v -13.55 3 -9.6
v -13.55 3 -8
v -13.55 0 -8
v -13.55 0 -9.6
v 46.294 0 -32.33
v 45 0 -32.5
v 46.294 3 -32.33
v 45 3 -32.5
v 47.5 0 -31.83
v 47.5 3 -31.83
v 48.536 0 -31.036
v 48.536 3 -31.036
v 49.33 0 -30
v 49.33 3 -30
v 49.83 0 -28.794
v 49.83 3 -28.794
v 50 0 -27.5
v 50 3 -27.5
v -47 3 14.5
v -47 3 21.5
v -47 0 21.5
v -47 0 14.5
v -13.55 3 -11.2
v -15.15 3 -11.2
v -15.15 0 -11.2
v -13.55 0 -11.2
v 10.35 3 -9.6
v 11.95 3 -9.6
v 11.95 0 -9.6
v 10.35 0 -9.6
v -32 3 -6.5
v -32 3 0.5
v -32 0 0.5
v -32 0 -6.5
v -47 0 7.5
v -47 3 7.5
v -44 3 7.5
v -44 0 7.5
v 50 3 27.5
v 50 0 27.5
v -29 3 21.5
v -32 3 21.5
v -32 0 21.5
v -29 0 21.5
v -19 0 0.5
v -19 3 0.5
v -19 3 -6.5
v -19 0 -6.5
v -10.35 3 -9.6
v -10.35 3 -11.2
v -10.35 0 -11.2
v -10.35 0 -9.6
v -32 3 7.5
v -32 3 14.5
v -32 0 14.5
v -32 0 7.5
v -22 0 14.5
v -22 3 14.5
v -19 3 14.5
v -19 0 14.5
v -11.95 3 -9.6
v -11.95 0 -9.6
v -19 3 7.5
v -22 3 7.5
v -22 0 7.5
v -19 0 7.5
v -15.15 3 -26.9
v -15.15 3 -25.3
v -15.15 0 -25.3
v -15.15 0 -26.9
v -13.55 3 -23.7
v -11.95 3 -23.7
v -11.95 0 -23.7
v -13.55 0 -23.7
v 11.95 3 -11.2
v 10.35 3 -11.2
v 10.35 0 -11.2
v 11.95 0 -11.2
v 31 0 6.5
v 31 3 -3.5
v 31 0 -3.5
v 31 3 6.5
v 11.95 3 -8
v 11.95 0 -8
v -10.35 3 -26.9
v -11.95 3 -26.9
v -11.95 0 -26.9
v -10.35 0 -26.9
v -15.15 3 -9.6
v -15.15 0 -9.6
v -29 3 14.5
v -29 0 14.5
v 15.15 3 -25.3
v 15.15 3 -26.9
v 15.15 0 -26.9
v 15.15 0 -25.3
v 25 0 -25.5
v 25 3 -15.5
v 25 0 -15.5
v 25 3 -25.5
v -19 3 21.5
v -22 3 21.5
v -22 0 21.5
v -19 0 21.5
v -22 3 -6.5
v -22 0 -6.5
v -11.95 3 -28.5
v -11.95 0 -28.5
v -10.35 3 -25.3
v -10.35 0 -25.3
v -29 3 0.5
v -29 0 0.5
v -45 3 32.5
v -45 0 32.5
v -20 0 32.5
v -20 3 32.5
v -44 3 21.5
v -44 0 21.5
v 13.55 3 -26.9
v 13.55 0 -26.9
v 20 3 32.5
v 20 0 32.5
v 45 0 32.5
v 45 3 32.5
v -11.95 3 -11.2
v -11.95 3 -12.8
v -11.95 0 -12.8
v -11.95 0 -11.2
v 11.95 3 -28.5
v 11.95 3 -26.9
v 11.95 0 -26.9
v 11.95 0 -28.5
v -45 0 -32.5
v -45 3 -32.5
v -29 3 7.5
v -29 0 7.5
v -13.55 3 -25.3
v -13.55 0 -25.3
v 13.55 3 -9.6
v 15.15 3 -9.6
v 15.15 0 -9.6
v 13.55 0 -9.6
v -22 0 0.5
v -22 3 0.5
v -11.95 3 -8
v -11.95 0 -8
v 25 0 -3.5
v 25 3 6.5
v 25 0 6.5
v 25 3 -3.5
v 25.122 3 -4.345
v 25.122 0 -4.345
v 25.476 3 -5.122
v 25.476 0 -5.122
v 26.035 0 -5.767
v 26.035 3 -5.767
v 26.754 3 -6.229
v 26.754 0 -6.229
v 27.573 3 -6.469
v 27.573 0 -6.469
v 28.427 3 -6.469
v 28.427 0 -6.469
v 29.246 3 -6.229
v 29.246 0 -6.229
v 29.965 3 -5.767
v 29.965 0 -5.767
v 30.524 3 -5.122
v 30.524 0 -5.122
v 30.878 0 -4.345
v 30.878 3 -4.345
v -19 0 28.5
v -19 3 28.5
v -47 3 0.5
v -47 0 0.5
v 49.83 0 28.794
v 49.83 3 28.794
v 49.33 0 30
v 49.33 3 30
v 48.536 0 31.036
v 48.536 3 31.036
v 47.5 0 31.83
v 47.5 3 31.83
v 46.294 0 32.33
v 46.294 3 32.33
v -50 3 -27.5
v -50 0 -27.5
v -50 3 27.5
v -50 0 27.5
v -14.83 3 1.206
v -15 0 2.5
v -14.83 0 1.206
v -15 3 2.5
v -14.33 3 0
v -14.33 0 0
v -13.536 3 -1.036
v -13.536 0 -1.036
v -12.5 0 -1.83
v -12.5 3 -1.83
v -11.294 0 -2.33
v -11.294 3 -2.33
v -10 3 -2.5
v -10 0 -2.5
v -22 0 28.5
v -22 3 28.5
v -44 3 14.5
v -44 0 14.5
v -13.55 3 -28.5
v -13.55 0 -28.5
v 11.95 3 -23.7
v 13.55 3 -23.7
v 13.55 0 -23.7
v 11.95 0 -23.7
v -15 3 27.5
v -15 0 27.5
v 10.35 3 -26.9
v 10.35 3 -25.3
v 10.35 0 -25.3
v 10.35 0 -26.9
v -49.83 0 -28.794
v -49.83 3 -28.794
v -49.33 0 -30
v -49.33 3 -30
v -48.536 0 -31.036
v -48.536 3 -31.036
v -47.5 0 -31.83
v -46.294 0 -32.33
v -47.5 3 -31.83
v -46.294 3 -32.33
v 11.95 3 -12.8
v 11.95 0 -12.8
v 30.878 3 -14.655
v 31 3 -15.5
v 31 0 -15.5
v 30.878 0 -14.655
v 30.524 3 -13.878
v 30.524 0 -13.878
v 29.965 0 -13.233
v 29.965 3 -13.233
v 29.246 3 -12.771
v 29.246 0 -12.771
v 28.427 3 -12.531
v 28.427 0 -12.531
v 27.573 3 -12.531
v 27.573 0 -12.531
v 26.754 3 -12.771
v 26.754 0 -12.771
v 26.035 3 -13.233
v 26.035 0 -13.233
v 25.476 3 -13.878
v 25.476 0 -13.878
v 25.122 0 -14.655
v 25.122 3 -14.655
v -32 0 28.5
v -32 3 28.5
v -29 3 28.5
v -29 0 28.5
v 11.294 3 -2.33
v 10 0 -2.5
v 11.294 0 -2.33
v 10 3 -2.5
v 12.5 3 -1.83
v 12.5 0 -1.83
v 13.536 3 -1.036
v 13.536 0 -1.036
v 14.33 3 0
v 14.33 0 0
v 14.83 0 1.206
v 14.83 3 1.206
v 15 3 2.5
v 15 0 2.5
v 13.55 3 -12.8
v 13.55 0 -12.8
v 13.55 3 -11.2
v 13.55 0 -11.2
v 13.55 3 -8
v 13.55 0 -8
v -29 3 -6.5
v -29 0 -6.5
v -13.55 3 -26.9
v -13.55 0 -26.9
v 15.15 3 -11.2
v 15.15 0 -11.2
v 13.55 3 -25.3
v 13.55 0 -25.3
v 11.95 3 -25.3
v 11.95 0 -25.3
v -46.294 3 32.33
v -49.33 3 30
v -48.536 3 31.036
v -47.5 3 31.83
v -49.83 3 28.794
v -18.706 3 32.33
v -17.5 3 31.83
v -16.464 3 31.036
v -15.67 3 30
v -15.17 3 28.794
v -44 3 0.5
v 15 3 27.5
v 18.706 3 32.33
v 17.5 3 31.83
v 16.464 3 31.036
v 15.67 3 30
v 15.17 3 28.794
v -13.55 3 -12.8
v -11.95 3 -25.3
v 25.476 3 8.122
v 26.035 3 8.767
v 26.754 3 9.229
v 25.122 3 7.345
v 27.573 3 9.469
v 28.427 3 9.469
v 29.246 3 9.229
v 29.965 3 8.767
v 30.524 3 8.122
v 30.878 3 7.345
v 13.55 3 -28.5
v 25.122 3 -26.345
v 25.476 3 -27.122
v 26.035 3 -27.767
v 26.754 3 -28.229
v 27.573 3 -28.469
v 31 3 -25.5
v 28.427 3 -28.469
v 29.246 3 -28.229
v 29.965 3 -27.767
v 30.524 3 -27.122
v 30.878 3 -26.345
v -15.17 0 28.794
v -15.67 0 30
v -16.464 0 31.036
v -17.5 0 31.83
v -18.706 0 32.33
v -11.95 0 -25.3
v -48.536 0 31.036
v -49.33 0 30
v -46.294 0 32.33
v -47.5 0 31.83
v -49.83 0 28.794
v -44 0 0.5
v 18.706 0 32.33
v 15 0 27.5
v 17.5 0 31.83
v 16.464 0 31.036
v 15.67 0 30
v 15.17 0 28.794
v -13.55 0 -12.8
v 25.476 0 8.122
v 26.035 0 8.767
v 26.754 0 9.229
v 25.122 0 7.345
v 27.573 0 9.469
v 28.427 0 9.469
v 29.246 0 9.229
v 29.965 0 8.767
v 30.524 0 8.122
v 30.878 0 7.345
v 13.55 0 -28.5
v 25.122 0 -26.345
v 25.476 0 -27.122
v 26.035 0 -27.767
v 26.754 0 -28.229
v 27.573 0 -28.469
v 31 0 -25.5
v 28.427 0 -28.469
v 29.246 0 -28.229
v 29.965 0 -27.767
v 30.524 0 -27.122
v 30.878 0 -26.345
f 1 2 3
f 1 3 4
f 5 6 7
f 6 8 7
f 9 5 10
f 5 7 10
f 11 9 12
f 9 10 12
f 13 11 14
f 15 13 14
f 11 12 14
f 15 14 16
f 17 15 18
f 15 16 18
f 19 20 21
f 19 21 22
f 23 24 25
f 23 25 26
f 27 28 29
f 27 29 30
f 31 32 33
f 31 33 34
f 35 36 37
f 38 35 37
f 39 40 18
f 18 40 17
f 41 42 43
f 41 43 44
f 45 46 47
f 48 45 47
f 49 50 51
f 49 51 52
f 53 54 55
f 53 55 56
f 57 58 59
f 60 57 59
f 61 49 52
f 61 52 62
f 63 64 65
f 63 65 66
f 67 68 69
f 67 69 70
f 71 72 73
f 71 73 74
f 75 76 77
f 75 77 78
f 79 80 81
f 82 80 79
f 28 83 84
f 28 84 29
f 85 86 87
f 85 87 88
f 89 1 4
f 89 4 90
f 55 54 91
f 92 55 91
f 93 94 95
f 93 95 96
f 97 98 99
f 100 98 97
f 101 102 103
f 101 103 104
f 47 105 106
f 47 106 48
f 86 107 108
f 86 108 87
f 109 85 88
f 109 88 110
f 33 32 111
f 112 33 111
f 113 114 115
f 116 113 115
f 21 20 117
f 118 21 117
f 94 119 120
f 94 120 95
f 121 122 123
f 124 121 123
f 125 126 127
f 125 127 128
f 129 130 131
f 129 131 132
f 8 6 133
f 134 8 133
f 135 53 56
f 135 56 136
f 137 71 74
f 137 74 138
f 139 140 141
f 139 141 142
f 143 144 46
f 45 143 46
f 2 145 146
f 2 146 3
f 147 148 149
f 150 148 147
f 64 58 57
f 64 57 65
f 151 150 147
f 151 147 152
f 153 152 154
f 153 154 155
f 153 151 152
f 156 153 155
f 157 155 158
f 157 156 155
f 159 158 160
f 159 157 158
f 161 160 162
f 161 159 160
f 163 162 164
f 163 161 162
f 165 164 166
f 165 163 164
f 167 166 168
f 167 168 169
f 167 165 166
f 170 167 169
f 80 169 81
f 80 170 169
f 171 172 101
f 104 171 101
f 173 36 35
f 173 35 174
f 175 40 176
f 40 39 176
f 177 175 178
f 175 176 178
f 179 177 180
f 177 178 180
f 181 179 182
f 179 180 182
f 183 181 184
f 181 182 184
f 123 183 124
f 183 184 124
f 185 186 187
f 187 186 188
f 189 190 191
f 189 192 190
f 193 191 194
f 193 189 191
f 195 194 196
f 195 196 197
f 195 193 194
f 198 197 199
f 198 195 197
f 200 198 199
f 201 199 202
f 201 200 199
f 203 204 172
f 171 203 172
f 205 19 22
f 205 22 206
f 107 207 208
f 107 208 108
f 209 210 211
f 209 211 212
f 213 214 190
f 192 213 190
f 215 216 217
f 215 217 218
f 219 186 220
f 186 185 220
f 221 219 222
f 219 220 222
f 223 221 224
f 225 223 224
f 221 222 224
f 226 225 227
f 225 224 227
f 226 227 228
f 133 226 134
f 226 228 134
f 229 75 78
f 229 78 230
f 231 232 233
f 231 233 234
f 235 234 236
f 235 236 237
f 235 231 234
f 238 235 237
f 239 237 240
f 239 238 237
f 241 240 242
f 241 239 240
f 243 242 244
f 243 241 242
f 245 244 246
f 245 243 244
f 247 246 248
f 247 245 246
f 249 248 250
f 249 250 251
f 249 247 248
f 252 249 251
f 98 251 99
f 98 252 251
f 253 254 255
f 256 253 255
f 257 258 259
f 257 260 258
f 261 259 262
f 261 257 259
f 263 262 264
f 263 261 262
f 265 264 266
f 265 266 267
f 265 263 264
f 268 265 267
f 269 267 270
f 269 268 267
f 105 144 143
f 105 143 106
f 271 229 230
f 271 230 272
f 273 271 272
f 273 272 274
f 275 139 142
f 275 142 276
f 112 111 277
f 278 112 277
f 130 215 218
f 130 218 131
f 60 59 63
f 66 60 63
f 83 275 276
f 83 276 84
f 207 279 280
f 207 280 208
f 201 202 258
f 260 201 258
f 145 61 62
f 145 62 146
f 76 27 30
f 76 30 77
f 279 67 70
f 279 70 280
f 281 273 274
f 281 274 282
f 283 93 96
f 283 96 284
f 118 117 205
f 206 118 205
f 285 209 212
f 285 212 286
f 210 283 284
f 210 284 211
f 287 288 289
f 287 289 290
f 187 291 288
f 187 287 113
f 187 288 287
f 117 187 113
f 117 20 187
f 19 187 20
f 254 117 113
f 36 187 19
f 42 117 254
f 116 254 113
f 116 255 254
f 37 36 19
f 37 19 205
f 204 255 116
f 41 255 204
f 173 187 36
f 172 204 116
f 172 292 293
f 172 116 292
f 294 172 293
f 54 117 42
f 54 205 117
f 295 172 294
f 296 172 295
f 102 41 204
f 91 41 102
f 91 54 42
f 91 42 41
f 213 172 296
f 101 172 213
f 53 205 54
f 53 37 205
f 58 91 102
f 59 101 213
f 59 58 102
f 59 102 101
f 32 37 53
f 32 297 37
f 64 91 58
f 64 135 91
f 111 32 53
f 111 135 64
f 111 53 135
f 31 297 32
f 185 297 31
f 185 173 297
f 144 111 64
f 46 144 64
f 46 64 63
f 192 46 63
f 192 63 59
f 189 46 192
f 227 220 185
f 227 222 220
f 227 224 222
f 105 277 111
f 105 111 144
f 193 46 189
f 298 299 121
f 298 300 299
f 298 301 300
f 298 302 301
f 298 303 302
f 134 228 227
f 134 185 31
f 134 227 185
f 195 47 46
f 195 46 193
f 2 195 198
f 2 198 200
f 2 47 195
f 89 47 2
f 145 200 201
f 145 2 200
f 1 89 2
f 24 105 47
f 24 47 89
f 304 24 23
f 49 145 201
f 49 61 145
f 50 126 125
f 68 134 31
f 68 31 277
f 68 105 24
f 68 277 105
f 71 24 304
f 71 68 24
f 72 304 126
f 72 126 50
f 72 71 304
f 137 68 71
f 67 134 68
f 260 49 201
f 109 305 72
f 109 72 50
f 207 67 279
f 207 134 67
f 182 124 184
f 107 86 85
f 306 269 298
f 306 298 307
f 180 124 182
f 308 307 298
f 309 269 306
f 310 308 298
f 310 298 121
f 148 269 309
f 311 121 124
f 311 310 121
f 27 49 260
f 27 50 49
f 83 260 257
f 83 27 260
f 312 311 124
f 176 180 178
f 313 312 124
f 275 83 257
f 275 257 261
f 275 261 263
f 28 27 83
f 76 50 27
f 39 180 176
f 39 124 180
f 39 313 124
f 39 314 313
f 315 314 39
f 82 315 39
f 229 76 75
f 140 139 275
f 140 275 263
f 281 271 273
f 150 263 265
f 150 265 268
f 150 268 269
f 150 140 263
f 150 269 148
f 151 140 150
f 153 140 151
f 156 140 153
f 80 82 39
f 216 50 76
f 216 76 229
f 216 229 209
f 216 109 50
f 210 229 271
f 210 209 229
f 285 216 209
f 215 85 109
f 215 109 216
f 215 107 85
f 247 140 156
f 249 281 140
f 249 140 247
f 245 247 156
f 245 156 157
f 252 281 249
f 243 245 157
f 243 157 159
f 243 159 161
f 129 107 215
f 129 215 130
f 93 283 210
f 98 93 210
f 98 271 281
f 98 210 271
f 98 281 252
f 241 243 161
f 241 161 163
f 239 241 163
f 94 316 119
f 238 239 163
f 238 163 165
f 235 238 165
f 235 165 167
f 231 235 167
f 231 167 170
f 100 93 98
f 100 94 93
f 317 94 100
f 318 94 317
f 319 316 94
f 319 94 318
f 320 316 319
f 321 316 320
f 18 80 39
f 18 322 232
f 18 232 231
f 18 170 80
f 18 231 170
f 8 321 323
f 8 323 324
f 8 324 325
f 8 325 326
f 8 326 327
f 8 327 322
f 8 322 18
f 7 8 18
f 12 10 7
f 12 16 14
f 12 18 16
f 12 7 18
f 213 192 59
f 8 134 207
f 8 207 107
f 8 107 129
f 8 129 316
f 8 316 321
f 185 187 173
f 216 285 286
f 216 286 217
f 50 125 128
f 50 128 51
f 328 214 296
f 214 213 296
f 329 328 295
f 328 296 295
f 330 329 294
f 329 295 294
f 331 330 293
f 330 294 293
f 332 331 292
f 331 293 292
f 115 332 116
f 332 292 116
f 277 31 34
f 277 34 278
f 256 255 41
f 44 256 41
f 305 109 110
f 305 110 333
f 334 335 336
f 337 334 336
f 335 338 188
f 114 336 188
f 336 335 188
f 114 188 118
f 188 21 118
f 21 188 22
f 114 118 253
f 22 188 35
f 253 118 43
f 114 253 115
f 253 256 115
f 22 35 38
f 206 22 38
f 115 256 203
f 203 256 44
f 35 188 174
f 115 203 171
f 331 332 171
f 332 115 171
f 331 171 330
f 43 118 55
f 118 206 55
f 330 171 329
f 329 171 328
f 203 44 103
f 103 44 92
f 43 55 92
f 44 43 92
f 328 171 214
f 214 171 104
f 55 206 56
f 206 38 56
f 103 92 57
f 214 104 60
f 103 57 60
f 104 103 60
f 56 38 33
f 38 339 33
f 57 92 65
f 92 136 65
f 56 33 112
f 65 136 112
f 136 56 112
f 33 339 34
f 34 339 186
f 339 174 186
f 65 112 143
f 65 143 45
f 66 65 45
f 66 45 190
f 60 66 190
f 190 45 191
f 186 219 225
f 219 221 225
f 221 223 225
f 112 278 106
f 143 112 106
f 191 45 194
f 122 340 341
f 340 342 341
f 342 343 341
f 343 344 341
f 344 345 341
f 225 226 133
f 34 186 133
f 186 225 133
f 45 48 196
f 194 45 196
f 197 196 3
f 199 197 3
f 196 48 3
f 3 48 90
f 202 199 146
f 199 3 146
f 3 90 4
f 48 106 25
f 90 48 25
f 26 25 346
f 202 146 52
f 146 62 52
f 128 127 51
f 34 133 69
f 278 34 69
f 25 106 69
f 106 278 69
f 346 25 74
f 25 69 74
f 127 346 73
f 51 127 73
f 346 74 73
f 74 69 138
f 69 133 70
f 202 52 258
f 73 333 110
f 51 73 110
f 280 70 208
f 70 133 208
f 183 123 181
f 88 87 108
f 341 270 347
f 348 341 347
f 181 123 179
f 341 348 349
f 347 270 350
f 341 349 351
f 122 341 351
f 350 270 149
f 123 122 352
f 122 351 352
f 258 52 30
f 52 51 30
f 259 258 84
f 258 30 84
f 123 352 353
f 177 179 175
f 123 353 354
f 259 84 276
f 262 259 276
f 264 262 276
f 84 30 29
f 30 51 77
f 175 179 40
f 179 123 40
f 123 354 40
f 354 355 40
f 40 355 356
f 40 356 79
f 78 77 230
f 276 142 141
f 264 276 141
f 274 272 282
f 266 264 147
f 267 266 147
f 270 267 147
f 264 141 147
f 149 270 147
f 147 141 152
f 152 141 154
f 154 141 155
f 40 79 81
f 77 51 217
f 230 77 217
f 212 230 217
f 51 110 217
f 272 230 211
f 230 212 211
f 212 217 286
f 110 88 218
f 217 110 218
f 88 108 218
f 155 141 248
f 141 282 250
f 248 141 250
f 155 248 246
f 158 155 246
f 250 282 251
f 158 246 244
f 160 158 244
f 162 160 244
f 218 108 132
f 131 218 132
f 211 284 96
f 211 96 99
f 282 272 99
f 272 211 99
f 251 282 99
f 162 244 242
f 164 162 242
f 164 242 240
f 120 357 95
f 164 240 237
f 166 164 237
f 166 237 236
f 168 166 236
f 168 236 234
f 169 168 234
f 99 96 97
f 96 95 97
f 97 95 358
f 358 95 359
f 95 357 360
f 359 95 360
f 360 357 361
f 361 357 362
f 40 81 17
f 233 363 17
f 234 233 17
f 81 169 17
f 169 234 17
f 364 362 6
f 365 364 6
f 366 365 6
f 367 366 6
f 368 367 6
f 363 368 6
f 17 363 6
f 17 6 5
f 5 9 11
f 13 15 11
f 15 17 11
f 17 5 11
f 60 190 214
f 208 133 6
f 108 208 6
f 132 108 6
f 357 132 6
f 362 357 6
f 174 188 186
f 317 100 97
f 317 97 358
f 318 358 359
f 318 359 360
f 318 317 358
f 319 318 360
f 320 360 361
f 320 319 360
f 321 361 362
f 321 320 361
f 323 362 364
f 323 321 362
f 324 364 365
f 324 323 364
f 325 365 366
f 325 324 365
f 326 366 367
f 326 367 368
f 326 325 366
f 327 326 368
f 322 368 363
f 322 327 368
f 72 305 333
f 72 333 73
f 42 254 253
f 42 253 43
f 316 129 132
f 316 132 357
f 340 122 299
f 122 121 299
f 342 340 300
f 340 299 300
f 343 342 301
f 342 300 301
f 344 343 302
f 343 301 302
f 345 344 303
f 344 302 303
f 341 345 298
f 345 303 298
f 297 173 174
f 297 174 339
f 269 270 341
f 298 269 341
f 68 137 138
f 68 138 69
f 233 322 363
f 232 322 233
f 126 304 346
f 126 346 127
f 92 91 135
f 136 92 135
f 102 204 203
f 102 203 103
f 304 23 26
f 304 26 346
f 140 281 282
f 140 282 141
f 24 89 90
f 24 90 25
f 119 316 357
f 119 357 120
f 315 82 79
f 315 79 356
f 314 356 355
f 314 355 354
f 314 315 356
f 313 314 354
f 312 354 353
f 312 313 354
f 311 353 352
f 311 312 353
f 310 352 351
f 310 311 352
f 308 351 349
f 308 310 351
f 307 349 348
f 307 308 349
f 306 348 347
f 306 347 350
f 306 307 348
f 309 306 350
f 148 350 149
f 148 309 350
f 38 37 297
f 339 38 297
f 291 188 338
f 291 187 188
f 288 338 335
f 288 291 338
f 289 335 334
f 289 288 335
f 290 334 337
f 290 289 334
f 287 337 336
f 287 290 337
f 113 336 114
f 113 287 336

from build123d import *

# Parameters (mm, degrees)
BOSS_EXTRUDE1_DEPTH  = 3
FILLET1_R            = 5
FILLET2_R            = 5
SKETCH2_W            = 3
SKETCH2_H            = 7
CUT_EXTRUDE1_DEPTH   = 3
LPATTERN1_COUNT      = 3
LPATTERN1_PITCH      = 14
LPATTERN1_COUNT_DIR2 = 2
LPATTERN1_PITCH_DIR2 = 10
CUT_EXTRUDE2_DEPTH   = 3
LPATTERN2_COUNT      = 2
LPATTERN2_PITCH      = 25.5
LPATTERN2_COUNT_DIR2 = 2
LPATTERN2_PITCH_DIR2 = 15.7
FILLET3_R            = 5
FILLET4_R            = 5
FILLET5_R            = 5
FILLET6_R            = 5
FILLET7_R            = 5
FILLET8_R            = 5
CUT_EXTRUDE3_DEPTH   = 3
LPATTERN3_COUNT      = 2
LPATTERN3_PITCH      = 22
SKETCH5_W            = 3
SKETCH5_H            = 7
CUT_EXTRUDE4_DEPTH   = 3
LPATTERN4_COUNT      = 2
LPATTERN4_PITCH      = 14


with BuildPart() as part:
    # Sketch1 → Boss-Extrude1 (new body)
    with BuildSketch(Plane(origin=(0, 0, 0), x_dir=(1, 0, 0), z_dir=(0, 1, 0))):
        Polygon((15, -32.5), (50, -32.5), (50, 32.5), (-50, 32.5), (-50, -32.5), (-15, -32.5), (-15, 2.5), (15, 2.5), align=None)
    extrude(amount=BOSS_EXTRUDE1_DEPTH)

    # Fillet1
    fillet1_edges = [part.edges().sort_by_distance(p)[0] for p in [
        (-15, 1.5, -2.5),
    ]]
    fillet(fillet1_edges, radius=FILLET1_R)

    # Fillet2
    fillet2_edges = [part.edges().sort_by_distance(p)[0] for p in [
        (15, 1.5, -2.5),
    ]]
    fillet(fillet2_edges, radius=FILLET2_R)

    # Sketch2 → Cut-Extrude1 (cut)
    with BuildSketch(Plane(origin=(0, 3, 0), x_dir=(1, 0, 0), z_dir=(0, 1, 0))):
        with Locations((-20.5, 3)):
            Rectangle(SKETCH2_W, SKETCH2_H)
    cut_extrude1 = extrude(amount=-CUT_EXTRUDE1_DEPTH, mode=Mode.SUBTRACT)

    # LPattern1: Cut-Extrude1 3 × 2
    with Locations(*[(-j * LPATTERN1_PITCH_DIR2, 0, i * LPATTERN1_PITCH) for i in range(LPATTERN1_COUNT) for j in range(LPATTERN1_COUNT_DIR2) if (i, j) != (0, 0)]):
        add(cut_extrude1, mode=Mode.SUBTRACT)

    # Sketch3 → Cut-Extrude2 (cut)
    with BuildSketch(Plane(origin=(0, 3, 0), x_dir=(1, 0, 0), z_dir=(0, 1, 0))):
        Polygon((-13.55, 28.5), (-11.95, 28.5), (-11.95, 26.9), (-10.35, 26.9), (-10.35, 25.3), (-11.95, 25.3), (-11.95, 23.7), (-13.55, 23.7), (-13.55, 25.3), (-15.15, 25.3), (-15.15, 26.9), (-13.55, 26.9), align=None)
    cut_extrude2 = extrude(amount=-CUT_EXTRUDE2_DEPTH, mode=Mode.SUBTRACT)

    # LPattern2: Cut-Extrude2 2 × 2
    with Locations(*[(i * LPATTERN2_PITCH, 0, j * LPATTERN2_PITCH_DIR2) for i in range(LPATTERN2_COUNT) for j in range(LPATTERN2_COUNT_DIR2) if (i, j) != (0, 0)]):
        add(cut_extrude2, mode=Mode.SUBTRACT)

    # Fillet3
    fillet3_edges = [part.edges().sort_by_distance(p)[0] for p in [
        (-50, 1.5, -32.5),
    ]]
    fillet(fillet3_edges, radius=FILLET3_R)

    # Fillet4
    fillet4_edges = [part.edges().sort_by_distance(p)[0] for p in [
        (50, 1.5, -32.5),
    ]]
    fillet(fillet4_edges, radius=FILLET4_R)

    # Fillet5
    fillet5_edges = [part.edges().sort_by_distance(p)[0] for p in [
        (-50, 1.5, 32.5),
    ]]
    fillet(fillet5_edges, radius=FILLET5_R)

    # Fillet6
    fillet6_edges = [part.edges().sort_by_distance(p)[0] for p in [
        (50, 1.5, 32.5),
    ]]
    fillet(fillet6_edges, radius=FILLET6_R)

    # Fillet7
    fillet7_edges = [part.edges().sort_by_distance(p)[0] for p in [
        (15, 1.5, 32.5),
    ]]
    fillet(fillet7_edges, radius=FILLET7_R)

    # Fillet8
    fillet8_edges = [part.edges().sort_by_distance(p)[0] for p in [
        (-15, 1.5, 32.5),
    ]]
    fillet(fillet8_edges, radius=FILLET8_R)

    # Sketch4 → Cut-Extrude3 (cut)
    with BuildSketch(Plane(origin=(0, 3, 0), x_dir=(1, 0, 0), z_dir=(0, 1, 0))):
        with BuildLine():
            Line((31, 25.5), (31, 15.5))
            ThreePointArc((31, 15.5), (28, 12.5), (25, 15.5))
            Line((25, 15.5), (25, 25.5))
            ThreePointArc((25, 25.5), (28, 28.5), (31, 25.5))
        make_face()
    cut_extrude3 = extrude(amount=-CUT_EXTRUDE3_DEPTH, mode=Mode.SUBTRACT)

    # LPattern3: Cut-Extrude3 ×2
    with Locations(*[(0, 0, i * LPATTERN3_PITCH) for i in range(1, LPATTERN3_COUNT)]):
        add(cut_extrude3, mode=Mode.SUBTRACT)

    # Sketch5 → Cut-Extrude4 (cut)
    with BuildSketch(Plane(origin=(0, 3, 0), x_dir=(1, 0, 0), z_dir=(0, 1, 0))):
        with Locations((-45.5, -4)):
            Rectangle(SKETCH5_W, SKETCH5_H)
    cut_extrude4 = extrude(amount=-CUT_EXTRUDE4_DEPTH, mode=Mode.SUBTRACT)

    # LPattern4: Cut-Extrude4 ×2
    with Locations(*[(0, 0, i * LPATTERN4_PITCH) for i in range(1, LPATTERN4_COUNT)]):
        add(cut_extrude4, mode=Mode.SUBTRACT)


solid = part.part
